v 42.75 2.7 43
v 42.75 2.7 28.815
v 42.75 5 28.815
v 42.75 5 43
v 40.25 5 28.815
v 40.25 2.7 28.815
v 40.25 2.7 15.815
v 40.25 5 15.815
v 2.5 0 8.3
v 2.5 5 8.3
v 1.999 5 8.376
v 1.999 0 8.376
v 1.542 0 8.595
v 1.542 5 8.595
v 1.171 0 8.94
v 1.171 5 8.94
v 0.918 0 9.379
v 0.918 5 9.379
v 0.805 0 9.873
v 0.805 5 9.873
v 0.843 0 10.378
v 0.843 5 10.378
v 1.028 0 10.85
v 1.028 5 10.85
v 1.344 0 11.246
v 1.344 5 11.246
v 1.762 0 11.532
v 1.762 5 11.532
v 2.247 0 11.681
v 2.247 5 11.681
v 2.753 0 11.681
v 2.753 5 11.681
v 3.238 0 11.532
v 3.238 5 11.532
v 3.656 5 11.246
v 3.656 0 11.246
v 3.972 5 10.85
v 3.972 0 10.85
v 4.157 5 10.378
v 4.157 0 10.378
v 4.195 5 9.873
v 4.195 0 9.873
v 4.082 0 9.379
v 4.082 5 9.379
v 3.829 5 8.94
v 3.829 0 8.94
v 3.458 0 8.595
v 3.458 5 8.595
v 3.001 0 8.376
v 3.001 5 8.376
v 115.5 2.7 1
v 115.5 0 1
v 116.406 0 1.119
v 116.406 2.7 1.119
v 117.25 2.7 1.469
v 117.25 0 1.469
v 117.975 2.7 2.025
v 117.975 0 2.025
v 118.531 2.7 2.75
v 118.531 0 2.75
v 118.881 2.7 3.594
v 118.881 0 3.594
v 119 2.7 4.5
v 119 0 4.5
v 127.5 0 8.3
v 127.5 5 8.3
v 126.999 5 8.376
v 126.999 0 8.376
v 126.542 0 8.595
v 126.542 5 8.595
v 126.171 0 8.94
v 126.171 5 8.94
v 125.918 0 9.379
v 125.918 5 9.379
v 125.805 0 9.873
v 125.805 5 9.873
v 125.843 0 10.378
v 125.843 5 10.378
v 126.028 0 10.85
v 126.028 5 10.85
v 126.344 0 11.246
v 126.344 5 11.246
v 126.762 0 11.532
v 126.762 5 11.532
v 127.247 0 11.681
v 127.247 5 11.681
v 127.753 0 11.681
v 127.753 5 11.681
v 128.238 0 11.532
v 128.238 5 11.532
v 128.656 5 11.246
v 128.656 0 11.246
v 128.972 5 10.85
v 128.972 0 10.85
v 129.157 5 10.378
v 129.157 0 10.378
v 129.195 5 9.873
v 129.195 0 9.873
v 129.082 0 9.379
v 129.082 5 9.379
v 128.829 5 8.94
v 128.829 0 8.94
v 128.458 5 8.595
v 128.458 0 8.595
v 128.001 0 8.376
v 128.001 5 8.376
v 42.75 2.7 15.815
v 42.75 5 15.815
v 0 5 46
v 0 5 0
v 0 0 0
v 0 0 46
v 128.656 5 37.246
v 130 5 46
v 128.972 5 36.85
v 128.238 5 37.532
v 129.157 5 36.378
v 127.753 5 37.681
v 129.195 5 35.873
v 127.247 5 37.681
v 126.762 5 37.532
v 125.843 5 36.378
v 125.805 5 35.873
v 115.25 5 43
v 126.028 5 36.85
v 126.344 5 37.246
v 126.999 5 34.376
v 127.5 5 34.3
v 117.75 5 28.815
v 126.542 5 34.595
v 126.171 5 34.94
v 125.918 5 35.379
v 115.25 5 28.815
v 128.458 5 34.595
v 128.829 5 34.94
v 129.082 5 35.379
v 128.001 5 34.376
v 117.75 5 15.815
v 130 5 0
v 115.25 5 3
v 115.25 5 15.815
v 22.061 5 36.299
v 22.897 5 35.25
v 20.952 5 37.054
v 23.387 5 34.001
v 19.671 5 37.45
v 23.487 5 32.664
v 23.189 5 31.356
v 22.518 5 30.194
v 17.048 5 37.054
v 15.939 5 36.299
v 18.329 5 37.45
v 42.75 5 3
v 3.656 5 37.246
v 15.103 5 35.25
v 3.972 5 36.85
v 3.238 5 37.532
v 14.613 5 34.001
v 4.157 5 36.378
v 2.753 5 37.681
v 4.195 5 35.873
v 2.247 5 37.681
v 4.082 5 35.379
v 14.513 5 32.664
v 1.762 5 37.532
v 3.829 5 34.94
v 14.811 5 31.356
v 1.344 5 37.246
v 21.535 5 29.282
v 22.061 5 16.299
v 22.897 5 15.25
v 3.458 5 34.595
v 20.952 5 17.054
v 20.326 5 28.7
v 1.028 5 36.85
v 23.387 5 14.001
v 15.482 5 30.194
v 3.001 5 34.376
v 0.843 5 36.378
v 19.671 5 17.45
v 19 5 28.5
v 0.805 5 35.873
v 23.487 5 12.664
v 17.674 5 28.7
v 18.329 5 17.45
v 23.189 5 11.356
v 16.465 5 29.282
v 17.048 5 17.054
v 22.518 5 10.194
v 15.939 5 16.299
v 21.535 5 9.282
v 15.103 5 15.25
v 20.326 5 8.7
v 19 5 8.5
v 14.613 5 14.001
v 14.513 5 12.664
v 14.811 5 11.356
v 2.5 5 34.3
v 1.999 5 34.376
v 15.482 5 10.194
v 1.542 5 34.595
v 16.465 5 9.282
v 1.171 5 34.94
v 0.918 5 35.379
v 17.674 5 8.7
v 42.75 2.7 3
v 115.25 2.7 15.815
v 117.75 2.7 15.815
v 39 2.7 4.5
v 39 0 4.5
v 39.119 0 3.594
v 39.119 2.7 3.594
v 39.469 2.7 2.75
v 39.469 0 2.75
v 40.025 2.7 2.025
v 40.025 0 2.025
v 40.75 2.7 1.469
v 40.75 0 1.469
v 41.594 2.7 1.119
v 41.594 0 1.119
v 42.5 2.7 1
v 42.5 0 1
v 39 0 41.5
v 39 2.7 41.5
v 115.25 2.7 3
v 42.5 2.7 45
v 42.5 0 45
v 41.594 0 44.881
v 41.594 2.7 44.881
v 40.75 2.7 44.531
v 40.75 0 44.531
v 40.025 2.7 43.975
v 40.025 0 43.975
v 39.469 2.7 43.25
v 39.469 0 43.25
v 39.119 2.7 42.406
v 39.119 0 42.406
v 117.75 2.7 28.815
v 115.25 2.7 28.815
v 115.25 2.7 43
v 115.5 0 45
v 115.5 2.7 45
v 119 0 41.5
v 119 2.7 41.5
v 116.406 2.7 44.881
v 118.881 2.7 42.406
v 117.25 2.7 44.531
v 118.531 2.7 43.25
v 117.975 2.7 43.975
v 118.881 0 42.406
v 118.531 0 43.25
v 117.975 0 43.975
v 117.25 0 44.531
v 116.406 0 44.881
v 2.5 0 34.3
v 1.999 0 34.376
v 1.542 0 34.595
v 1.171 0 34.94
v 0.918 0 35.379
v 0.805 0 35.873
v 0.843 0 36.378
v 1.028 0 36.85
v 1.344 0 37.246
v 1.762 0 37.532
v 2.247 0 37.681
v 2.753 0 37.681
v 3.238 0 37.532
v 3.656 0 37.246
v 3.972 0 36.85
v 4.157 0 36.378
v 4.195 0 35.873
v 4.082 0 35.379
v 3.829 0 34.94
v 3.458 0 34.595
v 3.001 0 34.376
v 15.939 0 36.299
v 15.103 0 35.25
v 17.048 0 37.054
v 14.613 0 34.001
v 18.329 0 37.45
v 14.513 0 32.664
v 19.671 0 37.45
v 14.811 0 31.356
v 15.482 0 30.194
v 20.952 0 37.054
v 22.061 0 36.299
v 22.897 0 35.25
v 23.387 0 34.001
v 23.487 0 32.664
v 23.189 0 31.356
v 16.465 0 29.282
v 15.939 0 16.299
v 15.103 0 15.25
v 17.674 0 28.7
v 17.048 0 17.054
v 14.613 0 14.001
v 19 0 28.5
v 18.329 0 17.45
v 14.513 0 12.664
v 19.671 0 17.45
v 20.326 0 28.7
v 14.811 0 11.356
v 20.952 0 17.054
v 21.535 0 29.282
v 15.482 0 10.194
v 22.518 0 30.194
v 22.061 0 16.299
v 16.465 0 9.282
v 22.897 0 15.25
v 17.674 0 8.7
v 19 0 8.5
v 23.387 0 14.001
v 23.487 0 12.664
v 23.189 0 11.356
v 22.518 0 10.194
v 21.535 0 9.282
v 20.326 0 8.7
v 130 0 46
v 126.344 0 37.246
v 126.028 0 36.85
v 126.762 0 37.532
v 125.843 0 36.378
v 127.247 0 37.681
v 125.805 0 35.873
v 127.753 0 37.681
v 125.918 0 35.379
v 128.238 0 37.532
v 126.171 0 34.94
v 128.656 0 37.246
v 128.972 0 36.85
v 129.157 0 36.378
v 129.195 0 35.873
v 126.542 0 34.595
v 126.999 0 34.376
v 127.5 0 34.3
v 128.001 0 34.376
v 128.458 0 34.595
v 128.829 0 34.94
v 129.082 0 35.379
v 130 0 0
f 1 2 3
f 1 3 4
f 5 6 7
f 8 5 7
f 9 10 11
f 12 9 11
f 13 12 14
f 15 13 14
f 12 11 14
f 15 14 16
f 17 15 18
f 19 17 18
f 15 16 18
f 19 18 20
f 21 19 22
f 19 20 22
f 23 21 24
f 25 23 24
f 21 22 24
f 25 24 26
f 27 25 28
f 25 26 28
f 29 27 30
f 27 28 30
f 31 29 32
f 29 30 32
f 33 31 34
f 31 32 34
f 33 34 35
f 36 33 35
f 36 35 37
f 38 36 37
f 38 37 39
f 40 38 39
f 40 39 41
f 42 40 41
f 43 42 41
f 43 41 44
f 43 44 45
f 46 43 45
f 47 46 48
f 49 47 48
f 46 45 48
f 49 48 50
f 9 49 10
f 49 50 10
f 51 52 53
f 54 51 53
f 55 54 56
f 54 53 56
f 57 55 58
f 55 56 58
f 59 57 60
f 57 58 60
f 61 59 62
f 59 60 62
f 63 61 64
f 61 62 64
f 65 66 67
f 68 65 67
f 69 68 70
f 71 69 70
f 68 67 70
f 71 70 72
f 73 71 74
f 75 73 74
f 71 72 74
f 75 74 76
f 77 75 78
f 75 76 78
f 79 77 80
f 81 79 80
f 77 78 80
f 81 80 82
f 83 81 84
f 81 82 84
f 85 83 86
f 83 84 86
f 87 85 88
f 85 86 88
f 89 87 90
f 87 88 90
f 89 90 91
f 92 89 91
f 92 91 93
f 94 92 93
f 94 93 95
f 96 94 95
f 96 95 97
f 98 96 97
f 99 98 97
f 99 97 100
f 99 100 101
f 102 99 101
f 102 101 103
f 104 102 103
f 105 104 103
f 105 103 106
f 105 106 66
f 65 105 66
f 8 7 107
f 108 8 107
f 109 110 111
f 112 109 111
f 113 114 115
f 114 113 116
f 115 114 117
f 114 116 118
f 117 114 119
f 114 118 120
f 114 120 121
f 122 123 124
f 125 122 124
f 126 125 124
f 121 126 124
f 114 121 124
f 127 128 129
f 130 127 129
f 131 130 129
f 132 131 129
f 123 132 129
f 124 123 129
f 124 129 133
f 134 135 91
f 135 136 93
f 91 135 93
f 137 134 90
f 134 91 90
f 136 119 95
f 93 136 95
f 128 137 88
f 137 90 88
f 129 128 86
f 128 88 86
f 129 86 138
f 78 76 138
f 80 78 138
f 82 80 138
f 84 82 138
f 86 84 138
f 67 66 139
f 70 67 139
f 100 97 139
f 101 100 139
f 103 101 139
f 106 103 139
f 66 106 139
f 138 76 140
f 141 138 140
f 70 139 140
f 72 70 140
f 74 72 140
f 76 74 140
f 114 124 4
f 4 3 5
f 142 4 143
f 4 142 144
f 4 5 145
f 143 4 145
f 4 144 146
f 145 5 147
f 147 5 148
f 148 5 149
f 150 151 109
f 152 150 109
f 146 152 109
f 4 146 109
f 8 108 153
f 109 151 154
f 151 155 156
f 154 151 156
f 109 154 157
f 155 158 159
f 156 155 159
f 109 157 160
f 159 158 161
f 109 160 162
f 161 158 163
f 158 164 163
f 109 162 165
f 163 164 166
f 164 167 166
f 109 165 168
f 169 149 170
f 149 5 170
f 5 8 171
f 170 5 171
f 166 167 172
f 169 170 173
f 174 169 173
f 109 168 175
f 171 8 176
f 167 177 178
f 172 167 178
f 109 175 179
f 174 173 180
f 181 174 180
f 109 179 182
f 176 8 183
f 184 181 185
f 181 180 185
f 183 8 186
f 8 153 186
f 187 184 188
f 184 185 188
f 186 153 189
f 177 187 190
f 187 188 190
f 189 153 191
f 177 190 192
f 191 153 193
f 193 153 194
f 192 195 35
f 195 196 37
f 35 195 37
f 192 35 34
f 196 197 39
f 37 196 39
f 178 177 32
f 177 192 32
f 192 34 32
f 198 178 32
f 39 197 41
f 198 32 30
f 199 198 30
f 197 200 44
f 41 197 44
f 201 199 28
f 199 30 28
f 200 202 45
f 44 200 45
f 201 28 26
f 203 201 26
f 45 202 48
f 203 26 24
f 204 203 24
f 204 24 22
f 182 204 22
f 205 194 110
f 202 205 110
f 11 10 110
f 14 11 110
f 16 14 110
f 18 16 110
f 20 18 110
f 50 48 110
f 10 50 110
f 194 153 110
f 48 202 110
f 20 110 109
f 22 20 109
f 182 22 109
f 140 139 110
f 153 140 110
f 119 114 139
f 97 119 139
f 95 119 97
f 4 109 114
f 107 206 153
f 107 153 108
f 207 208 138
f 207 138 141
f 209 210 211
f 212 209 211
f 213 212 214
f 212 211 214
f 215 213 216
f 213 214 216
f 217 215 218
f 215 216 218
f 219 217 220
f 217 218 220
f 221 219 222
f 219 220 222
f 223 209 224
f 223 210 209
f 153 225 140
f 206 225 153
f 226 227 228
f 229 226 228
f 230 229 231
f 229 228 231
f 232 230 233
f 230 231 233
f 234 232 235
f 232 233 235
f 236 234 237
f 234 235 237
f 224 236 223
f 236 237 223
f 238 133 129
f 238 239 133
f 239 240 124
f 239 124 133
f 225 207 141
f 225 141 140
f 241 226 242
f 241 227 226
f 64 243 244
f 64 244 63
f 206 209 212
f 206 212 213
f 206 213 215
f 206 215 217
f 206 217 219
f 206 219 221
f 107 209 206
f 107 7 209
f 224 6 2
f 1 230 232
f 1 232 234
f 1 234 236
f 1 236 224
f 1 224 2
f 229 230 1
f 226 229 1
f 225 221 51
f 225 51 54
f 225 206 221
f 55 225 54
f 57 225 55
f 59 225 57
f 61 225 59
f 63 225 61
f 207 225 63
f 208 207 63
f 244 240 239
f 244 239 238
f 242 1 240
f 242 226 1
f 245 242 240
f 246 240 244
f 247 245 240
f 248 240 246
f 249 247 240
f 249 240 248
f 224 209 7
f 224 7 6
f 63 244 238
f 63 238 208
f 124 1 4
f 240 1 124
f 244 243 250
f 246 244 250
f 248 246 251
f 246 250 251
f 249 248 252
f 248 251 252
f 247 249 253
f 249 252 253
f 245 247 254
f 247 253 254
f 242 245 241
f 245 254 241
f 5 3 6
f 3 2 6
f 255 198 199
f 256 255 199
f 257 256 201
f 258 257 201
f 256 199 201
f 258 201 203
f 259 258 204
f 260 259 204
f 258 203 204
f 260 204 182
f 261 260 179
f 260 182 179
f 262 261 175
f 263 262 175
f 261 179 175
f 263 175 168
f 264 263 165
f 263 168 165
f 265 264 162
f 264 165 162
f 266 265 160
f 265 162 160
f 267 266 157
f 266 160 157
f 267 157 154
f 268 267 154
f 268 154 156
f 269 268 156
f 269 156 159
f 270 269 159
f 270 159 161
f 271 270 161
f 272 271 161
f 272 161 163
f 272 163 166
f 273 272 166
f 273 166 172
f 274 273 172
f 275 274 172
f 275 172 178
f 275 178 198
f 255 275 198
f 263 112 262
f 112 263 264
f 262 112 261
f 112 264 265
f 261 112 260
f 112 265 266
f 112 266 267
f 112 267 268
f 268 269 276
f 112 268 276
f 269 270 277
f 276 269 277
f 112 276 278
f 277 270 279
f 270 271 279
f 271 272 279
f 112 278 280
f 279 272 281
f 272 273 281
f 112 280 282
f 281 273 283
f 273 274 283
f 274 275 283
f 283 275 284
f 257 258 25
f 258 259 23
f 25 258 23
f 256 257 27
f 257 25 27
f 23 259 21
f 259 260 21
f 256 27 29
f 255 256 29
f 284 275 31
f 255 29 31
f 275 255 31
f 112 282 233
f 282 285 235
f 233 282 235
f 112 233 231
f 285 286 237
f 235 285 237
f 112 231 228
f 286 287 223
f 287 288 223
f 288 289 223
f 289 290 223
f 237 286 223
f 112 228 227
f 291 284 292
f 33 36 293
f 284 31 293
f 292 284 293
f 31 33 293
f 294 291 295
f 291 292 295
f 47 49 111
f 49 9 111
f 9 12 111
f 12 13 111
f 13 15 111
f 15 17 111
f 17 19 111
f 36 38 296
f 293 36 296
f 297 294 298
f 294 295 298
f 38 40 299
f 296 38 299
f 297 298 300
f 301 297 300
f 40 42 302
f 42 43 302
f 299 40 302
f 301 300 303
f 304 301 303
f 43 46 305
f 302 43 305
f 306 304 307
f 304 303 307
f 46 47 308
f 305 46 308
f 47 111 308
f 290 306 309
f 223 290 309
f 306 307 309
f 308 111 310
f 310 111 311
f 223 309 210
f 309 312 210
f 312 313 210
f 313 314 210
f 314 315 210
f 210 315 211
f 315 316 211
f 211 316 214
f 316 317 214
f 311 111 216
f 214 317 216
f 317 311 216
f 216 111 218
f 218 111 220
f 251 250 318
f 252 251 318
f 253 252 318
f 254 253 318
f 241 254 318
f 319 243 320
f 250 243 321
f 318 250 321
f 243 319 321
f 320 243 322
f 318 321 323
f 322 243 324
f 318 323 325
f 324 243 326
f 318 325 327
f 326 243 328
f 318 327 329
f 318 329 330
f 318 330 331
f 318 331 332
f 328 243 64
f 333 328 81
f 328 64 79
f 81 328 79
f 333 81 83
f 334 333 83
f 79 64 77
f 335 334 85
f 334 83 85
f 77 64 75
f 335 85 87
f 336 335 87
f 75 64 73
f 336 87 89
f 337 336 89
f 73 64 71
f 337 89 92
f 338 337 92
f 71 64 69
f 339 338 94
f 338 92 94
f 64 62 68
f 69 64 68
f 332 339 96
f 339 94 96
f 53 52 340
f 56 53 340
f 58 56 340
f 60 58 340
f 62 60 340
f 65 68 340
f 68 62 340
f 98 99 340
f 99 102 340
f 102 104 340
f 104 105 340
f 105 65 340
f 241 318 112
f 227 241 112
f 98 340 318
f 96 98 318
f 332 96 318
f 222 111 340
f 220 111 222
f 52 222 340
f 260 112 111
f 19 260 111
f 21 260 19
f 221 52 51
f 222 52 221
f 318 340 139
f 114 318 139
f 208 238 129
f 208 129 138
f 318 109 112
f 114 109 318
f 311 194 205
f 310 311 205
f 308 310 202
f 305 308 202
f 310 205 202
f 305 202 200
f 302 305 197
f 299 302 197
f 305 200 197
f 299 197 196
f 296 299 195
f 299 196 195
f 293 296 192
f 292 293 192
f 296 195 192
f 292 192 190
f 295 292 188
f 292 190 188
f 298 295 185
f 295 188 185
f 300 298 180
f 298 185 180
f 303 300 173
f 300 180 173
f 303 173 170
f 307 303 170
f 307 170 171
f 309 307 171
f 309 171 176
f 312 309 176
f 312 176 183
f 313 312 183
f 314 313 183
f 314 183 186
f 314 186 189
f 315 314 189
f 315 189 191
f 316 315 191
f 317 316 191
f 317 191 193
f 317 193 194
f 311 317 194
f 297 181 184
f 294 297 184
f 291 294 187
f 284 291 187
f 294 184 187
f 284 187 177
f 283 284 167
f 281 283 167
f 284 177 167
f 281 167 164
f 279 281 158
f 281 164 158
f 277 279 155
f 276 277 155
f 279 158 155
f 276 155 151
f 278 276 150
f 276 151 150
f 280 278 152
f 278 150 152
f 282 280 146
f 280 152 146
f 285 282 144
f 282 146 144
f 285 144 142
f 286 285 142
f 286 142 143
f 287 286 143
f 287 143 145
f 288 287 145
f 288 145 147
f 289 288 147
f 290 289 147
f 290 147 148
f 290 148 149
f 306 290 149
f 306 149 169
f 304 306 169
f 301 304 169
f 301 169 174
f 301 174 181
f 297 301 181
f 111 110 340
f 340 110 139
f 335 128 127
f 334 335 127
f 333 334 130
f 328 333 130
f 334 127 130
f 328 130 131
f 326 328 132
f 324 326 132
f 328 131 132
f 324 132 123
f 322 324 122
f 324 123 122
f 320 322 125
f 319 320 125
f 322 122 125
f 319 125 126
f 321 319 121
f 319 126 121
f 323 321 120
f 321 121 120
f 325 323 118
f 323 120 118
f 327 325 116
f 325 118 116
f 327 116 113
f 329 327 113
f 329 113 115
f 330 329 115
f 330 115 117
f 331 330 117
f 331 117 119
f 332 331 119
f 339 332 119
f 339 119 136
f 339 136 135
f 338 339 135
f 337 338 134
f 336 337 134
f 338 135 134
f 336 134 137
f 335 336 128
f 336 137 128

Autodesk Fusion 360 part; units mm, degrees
sketch "Sketch1" plane through (0, 0, 0) normal (0, 0, 1) x (1, 0, 0)
  line L0 (0, 0) -> (130, 0)
  line L1 (130, 0) -> (130, 5)
  line L2 (130, 5) -> (0, 5)
  line L3 (0, 5) -> (0, 0)
  dimension "d1" = 130
  dimension "d2" = 5
extrude "Extrude1" add sketch "Sketch1" along normal blind 46
sketch "Sketch2" plane through (0, 0, 0) normal (0, -1, 0) x (1, 0, 0)
  line L0 (0, 0) -> (130, 0)
  line L1 (130, 0) -> (130, 46)
  line L2 (130, 46) -> (0, 46)
  line L3 (0, 46) -> (0, 0)
  line L4 (42.5, 45) -> (115.5, 45)
  line L5 (119, 41.5) -> (119, 4.5)
  line L6 (115.5, 1) -> (42.5, 1)
  line L7 (39, 4.5) -> (39, 41.5)
  line L8 (125, 46) -> (125, 0) construction
  line L9 (5, 46) -> (5, 0) construction
  line L10 (42.75, 43) -> (115.25, 43)
  line L11 (115.25, 3) -> (42.75, 3)
  line L12 (42.75, 28.8154) -> (40.25, 28.8154)
  line L13 (40.25, 28.8154) -> (40.25, 15.8154)
  line L14 (40.25, 15.8154) -> (42.75, 15.8154)
  line L15 (115.25, 28.8154) -> (117.75, 28.8154)
  line L16 (117.75, 28.8154) -> (117.75, 15.8154)
  line L17 (117.75, 15.8154) -> (115.25, 15.8154)
  line L18 (115.25, 43) -> (115.25, 28.8154)
  line L19 (115.25, 15.8154) -> (115.25, 3)
  line L20 (42.75, 3) -> (42.75, 15.8154)
  line L21 (42.75, 28.8154) -> (42.75, 43)
  arc A0 (42.5, 45) -> (39, 41.5) centre (42.5, 41.5) ccw
  arc A1 (119, 41.5) -> (115.5, 45) centre (115.5, 41.5) ccw
  arc A2 (115.5, 1) -> (119, 4.5) centre (115.5, 4.5) ccw
  arc A3 (39, 4.5) -> (42.5, 1) centre (42.5, 4.5) ccw
  point P0 (39, 45)
  point P1 (119, 45)
  point P2 (39, 1)
  dimension "d5" = 80
  dimension "d6" = 44
  dimension "d7" = 5
  dimension "d8" = 5
  dimension "d9" = 6
  dimension "d10" = 1
  dimension "d25" = 2.5
  dimension "d26" = 13
  dimension "d28" = 13
  dimension "d35" = 3.5
  dimension "d59" = 72.5
  dimension "d60" = 40
  dimension "d62" = 2.5
  dimension "d63" = 1.25
  dimension "d64" = 2
extrude "Extrude5" cut sketch "Sketch2" against normal blind 5 contours L10 L11 L12 L13 L14 L15 L16 L17 L18 L19 L20 L21
sketch "Sketch4" plane through (0, 5, 0) normal (0, 1, 0) x (-1, 0, 0)
  line L0 (-40.25, 15.8154) -> (-42.75, 15.8154)
  line L1 (-42.75, 15.8154) -> (-42.75, 3)
  line L2 (-42.75, 3) -> (-115.25, 3)
  line L3 (-115.25, 3) -> (-115.25, 15.8154)
  line L4 (-115.25, 15.8154) -> (-117.75, 15.8154)
  line L5 (-117.75, 15.8154) -> (-117.75, 28.8154)
  line L6 (-117.75, 28.8154) -> (-115.25, 28.8154)
  line L7 (-115.25, 28.8154) -> (-115.25, 43)
  line L8 (-115.25, 43) -> (-42.75, 43)
  line L9 (-42.75, 43) -> (-42.75, 28.8154)
  line L10 (-42.75, 28.8154) -> (-40.25, 28.8154)
  line L11 (-40.25, 28.8154) -> (-40.25, 15.8154)
  line L12 (-130, 0) -> (0, 0)
  line L13 (0, 0) -> (0, 46)
  line L14 (0, 46) -> (-130, 46)
  line L15 (-130, 46) -> (-130, 0)
  line L16 (-118.25, 45) -> (-39.25, 45)
  line L17 (-39.25, 45) -> (-39.25, 2)
  line L18 (-39.25, 2) -> (-118.25, 2)
  line L19 (-118.25, 2) -> (-118.25, 45)
  line L20 (-42.75, 43) -> (-115.25, 43)
  dimension "d31" = 79
  dimension "d32" = 43
  dimension "d33" = 2
  dimension "d34" = 3.5
extrude "Extrude6" cut sketch "Sketch2" against normal blind 2.7 contours L4 L5 L6 L7 A0 A1 A2 A3
sketch "Sketch5" plane through (0, 0, 0) normal (0, -1, 0) x (1, 0, 0)
  line L0 (39, 4.5) -> (39, 41.5)
  arc A0 (42.5, 45) -> (39, 41.5) centre (42.5, 41.5) ccw
  line L1 (42.5, 45) -> (115.5, 45)
  arc A1 (119, 41.5) -> (115.5, 45) centre (115.5, 41.5) ccw
  line L2 (119, 41.5) -> (119, 4.5)
  arc A2 (115.5, 1) -> (119, 4.5) centre (115.5, 4.5) ccw
  line L3 (115.5, 1) -> (42.5, 1)
  arc A3 (39, 4.5) -> (42.5, 1) centre (42.5, 4.5) ccw
  line L4 (0, 0) -> (130, 0)
  line L5 (130, 0) -> (130, 46)
  line L6 (130, 46) -> (0, 46)
  line L7 (0, 46) -> (0, 0)
  line L8 (19, 33) -> (19, 13) construction
  line L9 (5, 46) -> (5, 0) construction
  line L10 (39, 23) -> (19, 23) construction
  point P0 (19, 33)
  point P1 (19, 13)
  point P2 (19, 33)
  point P3 (19, 33)
  point P4 (19, 33)
  point P5 (19, 13)
  dimension "d40" = 20
  dimension "d41" = 20
  dimension "d42" = 5
hole "Hole1" at (19, 0, 33) at (19, 0, 13) direction (0, 1, 0) diameter 9 end through all
sketch "Sketch6" plane through (0, 0, 0) normal (0, -1, 0) x (1, 0, 0)
  circle A0 centre (19, 33) radius 4.5
  circle A1 centre (19, 13) radius 4.5
  line L0 (39, 4.5) -> (39, 41.5)
  arc A2 (42.5, 45) -> (39, 41.5) centre (42.5, 41.5) ccw
  line L1 (42.5, 45) -> (115.5, 45)
  arc A3 (119, 41.5) -> (115.5, 45) centre (115.5, 41.5) ccw
  line L2 (119, 41.5) -> (119, 4.5)
  arc A4 (115.5, 1) -> (119, 4.5) centre (115.5, 4.5) ccw
  line L3 (115.5, 1) -> (42.5, 1)
  arc A5 (39, 4.5) -> (42.5, 1) centre (42.5, 4.5) ccw
  line L4 (0, 0) -> (130, 0)
  line L5 (130, 0) -> (130, 46)
  line L6 (130, 46) -> (0, 46)
  line L7 (0, 46) -> (0, 0)
  line L8 (125, 46) -> (125, 0) construction
  line L9 (5, 46) -> (5, 0) construction
  point P0 (2.5, 36)
  point P1 (2.5, 10)
  point P2 (127.5, 36)
  point P3 (127.5, 10)
  dimension "d46" = 5
  dimension "d47" = 5
  dimension "d48" = 2.5
  dimension "d49" = 10
  dimension "d50" = 10
  dimension "d51" = 2.5
  dimension "d52" = 2.5
  dimension "d53" = 10
  dimension "d54" = 10
  dimension "d55" = 2.5
hole "Hole2" at (127.5, 0, 36) at (127.5, 0, 10) at (2.5, 0, 36) at (2.5, 0, 10) direction (0, 1, 0) diameter 3.4 depth 5 tip angle 180
